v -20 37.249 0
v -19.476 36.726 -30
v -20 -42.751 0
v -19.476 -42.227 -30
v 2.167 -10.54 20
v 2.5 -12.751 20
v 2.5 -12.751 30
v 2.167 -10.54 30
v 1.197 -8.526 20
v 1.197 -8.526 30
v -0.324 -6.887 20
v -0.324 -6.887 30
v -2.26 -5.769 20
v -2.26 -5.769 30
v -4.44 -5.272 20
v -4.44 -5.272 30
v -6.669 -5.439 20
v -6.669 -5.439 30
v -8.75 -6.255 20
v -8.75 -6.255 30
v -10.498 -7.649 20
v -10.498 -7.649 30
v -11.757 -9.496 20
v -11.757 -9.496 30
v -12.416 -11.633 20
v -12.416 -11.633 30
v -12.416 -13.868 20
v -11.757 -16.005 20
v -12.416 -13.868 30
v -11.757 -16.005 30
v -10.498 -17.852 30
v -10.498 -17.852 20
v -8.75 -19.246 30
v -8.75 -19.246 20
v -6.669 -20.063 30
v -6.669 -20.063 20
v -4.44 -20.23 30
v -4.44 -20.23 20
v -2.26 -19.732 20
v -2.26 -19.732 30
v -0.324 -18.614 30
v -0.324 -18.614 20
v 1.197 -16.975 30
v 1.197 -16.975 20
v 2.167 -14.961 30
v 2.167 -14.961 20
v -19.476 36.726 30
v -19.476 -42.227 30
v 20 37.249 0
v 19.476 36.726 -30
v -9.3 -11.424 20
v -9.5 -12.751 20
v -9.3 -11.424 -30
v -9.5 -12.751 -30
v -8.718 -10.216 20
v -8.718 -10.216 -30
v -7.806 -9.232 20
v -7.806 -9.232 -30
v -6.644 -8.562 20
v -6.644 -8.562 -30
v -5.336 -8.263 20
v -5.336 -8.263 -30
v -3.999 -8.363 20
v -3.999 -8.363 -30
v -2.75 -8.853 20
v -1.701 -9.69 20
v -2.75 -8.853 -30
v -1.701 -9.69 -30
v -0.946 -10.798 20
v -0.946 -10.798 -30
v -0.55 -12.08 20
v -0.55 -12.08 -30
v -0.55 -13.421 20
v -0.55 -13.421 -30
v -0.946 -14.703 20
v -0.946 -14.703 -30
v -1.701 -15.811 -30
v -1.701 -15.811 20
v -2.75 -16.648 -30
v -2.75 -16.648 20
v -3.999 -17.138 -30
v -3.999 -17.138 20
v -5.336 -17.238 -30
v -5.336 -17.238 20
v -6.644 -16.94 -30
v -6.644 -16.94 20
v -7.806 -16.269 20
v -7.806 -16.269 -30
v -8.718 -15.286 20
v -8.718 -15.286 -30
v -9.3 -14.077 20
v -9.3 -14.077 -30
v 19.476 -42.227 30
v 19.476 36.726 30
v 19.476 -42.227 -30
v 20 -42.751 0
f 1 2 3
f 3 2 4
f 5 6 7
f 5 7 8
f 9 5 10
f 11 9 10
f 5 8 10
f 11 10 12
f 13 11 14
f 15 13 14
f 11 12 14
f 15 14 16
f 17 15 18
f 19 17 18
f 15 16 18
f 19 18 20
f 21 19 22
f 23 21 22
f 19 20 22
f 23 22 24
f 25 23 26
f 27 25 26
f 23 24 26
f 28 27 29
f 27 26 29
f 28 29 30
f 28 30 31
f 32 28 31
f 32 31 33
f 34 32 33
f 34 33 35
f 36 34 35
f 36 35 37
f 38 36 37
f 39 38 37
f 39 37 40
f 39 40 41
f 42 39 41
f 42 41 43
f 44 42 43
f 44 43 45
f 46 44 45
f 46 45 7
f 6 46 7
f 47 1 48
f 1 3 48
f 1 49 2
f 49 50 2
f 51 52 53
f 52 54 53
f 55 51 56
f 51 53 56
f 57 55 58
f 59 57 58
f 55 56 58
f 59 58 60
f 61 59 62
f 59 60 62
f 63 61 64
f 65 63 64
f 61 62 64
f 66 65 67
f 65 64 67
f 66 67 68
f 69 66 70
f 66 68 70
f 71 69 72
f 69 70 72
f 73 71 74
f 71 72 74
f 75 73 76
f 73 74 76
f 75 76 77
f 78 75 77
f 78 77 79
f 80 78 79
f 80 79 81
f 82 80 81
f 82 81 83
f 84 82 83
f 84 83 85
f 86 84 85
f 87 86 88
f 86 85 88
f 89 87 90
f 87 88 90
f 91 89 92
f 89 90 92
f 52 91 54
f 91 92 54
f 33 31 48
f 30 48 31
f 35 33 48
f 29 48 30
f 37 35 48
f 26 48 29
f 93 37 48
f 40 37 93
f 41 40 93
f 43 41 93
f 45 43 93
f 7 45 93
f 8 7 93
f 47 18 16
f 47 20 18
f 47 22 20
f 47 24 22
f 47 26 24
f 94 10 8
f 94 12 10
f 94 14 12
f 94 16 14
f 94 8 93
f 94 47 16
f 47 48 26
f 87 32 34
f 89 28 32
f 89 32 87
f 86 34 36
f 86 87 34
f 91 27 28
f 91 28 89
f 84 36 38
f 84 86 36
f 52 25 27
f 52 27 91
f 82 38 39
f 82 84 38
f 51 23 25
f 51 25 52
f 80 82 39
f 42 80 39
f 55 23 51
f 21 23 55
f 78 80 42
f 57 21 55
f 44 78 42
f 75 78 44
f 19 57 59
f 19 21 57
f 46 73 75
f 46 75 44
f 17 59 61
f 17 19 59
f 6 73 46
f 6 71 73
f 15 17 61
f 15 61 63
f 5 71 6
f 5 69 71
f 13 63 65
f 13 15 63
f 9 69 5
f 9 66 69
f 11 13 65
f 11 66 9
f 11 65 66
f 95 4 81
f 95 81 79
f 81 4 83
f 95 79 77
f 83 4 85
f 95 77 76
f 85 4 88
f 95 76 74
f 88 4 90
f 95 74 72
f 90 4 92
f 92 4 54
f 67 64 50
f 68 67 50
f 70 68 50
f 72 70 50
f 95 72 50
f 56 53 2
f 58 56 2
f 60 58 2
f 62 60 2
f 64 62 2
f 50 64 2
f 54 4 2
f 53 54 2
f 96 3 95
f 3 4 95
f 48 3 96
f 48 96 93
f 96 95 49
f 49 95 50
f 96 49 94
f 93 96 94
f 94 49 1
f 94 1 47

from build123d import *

# Parameters (mm, degrees)
F0_W           = 40
F0_H           = 80
F1_DEPTH       = 30
F1_TAPER       = 1
F3_D           = 9
F3_CBORE_D     = 15
F3_CBORE_DEPTH = 10


with BuildPart() as f1:
    # F0 (on Top) → F1 (new body, symmetric)
    with BuildSketch(Plane.XY):
        with Locations((0, -2.7505960315)):
            Rectangle(F0_W, F0_H)
    extrude(amount=F1_DEPTH, both=True, taper=F1_TAPER)

    # F3 (through all)
    with Locations(Plane.XY.offset(30)):
        with Locations((-5, -12.7505960315)):
            CounterBoreHole(F3_D / 2, F3_CBORE_D / 2, F3_CBORE_DEPTH)


solid = f1.part
